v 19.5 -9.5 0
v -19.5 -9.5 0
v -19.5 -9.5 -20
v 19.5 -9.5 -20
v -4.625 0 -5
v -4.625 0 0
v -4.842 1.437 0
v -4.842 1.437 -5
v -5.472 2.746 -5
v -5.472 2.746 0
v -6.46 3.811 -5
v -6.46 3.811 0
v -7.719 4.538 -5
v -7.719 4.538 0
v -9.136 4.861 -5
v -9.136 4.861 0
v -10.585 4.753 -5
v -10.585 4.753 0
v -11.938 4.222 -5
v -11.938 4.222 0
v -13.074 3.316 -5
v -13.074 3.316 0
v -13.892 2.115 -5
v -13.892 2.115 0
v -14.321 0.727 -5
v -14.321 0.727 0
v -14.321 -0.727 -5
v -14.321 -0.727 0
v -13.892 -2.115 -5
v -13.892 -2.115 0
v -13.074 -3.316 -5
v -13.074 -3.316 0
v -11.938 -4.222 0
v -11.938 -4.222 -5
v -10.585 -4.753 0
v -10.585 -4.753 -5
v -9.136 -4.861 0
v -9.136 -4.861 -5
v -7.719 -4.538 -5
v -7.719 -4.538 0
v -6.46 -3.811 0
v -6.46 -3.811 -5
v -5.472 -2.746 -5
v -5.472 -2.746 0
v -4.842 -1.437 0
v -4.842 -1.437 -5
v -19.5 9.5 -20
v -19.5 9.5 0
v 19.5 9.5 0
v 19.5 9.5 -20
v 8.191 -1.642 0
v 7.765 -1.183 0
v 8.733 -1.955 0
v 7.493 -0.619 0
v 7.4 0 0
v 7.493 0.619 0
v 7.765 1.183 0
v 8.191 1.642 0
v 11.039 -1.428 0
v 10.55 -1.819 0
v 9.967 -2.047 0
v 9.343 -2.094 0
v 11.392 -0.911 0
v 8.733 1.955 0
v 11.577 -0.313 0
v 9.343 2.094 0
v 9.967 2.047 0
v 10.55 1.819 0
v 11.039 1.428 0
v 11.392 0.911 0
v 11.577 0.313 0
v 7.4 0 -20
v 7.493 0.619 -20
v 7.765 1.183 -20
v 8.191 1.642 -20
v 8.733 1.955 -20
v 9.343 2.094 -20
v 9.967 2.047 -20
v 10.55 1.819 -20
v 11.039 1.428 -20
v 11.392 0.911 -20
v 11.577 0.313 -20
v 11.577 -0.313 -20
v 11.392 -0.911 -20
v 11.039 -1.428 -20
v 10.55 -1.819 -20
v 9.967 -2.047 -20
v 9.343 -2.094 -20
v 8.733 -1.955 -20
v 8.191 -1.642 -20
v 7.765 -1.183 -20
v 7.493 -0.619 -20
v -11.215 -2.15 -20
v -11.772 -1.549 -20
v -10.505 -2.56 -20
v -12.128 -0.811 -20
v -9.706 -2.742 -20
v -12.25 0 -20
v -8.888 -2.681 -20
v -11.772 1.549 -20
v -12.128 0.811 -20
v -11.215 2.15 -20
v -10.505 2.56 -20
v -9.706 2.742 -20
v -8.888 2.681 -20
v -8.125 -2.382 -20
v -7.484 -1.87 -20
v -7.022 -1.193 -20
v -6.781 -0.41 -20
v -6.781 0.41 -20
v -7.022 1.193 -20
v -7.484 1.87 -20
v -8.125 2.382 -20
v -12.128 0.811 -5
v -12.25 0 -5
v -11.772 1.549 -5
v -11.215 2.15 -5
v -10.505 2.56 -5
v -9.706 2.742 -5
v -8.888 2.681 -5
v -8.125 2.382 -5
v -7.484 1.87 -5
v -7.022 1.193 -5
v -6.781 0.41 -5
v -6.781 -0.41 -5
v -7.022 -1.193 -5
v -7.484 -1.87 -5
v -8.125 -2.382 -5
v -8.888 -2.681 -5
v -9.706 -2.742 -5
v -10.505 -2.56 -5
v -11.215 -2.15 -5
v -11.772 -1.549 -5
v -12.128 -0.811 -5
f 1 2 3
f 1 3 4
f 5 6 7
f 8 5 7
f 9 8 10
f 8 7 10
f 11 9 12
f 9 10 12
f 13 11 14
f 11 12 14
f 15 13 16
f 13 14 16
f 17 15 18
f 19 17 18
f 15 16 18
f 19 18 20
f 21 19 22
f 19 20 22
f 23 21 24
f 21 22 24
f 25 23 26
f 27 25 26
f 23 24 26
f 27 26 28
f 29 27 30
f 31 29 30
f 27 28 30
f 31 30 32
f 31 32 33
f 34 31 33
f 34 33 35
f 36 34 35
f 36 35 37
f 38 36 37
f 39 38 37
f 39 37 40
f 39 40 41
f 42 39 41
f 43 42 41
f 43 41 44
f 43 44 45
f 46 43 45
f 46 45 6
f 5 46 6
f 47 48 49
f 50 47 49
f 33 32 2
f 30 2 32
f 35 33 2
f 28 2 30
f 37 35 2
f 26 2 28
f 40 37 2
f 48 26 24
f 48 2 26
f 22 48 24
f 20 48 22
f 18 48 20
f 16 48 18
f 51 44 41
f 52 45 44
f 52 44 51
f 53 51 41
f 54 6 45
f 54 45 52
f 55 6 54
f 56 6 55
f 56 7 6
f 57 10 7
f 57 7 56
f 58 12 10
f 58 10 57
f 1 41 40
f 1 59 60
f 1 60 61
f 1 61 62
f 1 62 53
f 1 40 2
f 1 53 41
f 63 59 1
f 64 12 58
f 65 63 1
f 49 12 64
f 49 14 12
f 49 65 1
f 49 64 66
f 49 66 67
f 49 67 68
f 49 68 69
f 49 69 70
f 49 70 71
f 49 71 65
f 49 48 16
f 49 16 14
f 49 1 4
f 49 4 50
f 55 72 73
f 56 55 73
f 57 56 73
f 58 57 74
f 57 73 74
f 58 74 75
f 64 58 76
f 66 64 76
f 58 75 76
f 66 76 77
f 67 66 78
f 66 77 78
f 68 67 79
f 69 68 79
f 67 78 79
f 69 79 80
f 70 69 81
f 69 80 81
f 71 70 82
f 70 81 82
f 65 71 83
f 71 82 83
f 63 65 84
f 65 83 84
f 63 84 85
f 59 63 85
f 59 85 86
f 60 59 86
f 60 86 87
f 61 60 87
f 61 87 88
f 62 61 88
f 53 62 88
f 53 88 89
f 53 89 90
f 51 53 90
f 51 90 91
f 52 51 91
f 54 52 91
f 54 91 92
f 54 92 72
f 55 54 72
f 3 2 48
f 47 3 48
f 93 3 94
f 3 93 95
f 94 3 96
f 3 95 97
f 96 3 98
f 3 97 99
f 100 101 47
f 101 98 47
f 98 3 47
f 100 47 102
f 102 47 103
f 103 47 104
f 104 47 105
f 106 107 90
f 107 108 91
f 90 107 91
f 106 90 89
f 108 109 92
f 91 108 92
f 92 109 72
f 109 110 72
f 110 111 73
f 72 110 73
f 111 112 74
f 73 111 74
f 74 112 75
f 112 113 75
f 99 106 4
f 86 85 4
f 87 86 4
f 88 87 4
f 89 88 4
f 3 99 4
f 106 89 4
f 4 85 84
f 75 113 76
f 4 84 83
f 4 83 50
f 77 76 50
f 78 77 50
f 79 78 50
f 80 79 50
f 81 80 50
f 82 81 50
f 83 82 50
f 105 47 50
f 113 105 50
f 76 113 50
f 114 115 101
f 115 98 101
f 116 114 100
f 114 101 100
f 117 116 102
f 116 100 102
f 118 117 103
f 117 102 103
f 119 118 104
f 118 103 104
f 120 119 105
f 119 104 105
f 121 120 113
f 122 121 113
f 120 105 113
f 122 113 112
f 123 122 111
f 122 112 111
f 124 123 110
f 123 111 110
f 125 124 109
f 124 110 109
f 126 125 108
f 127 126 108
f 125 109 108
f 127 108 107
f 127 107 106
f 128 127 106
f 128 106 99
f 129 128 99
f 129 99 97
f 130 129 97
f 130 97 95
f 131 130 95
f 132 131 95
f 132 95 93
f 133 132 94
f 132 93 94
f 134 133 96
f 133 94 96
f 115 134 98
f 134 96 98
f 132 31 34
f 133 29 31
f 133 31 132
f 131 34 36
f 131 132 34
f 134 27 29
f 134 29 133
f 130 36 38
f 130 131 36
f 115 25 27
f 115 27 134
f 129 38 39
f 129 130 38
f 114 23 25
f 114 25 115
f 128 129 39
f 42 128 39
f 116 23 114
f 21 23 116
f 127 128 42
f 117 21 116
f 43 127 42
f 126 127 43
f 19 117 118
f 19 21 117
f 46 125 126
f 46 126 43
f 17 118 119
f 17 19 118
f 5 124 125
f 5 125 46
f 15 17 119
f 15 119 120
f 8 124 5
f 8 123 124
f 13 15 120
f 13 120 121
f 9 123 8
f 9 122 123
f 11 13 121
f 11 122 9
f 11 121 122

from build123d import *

# Parameters (mm, degrees)
F0_W           = 39
F0_H           = 19
F1_DEPTH       = 20
F2_D           = 5.5
F2_DEPTH       = 20
F2_CBORE_D     = 9.75
F2_CBORE_DEPTH = 5
F2_TIP         = 1.6523667023
F3_D           = 4.2
F3_DEPTH       = 22.4
F3_TIP         = 1.2618073


with BuildPart() as f1:
    # F0 (on Top) → F1 (new body)
    with BuildSketch(Plane.XY):
        Rectangle(F0_W, F0_H)
    extrude(amount=-F1_DEPTH)

    # F2
    with Locations(Plane.XY):
        with Locations((-9.5, 0)):
            CounterBoreHole(F2_D / 2, F2_CBORE_D / 2, F2_CBORE_DEPTH, depth=F2_DEPTH)
            with Locations((0, 0, -(F2_DEPTH + F2_TIP / 2))):  # 118° drill point
                Cone(0, F2_D / 2, F2_TIP, mode=Mode.SUBTRACT)

    # F3
    with Locations(Plane.XY):
        with Locations((9.5, 0)):
            Hole(F3_D / 2, depth=F3_DEPTH)
            with Locations((0, 0, -(F3_DEPTH + F3_TIP / 2))):  # 118° drill point
                Cone(0, F3_D / 2, F3_TIP, mode=Mode.SUBTRACT)


solid = f1.part
